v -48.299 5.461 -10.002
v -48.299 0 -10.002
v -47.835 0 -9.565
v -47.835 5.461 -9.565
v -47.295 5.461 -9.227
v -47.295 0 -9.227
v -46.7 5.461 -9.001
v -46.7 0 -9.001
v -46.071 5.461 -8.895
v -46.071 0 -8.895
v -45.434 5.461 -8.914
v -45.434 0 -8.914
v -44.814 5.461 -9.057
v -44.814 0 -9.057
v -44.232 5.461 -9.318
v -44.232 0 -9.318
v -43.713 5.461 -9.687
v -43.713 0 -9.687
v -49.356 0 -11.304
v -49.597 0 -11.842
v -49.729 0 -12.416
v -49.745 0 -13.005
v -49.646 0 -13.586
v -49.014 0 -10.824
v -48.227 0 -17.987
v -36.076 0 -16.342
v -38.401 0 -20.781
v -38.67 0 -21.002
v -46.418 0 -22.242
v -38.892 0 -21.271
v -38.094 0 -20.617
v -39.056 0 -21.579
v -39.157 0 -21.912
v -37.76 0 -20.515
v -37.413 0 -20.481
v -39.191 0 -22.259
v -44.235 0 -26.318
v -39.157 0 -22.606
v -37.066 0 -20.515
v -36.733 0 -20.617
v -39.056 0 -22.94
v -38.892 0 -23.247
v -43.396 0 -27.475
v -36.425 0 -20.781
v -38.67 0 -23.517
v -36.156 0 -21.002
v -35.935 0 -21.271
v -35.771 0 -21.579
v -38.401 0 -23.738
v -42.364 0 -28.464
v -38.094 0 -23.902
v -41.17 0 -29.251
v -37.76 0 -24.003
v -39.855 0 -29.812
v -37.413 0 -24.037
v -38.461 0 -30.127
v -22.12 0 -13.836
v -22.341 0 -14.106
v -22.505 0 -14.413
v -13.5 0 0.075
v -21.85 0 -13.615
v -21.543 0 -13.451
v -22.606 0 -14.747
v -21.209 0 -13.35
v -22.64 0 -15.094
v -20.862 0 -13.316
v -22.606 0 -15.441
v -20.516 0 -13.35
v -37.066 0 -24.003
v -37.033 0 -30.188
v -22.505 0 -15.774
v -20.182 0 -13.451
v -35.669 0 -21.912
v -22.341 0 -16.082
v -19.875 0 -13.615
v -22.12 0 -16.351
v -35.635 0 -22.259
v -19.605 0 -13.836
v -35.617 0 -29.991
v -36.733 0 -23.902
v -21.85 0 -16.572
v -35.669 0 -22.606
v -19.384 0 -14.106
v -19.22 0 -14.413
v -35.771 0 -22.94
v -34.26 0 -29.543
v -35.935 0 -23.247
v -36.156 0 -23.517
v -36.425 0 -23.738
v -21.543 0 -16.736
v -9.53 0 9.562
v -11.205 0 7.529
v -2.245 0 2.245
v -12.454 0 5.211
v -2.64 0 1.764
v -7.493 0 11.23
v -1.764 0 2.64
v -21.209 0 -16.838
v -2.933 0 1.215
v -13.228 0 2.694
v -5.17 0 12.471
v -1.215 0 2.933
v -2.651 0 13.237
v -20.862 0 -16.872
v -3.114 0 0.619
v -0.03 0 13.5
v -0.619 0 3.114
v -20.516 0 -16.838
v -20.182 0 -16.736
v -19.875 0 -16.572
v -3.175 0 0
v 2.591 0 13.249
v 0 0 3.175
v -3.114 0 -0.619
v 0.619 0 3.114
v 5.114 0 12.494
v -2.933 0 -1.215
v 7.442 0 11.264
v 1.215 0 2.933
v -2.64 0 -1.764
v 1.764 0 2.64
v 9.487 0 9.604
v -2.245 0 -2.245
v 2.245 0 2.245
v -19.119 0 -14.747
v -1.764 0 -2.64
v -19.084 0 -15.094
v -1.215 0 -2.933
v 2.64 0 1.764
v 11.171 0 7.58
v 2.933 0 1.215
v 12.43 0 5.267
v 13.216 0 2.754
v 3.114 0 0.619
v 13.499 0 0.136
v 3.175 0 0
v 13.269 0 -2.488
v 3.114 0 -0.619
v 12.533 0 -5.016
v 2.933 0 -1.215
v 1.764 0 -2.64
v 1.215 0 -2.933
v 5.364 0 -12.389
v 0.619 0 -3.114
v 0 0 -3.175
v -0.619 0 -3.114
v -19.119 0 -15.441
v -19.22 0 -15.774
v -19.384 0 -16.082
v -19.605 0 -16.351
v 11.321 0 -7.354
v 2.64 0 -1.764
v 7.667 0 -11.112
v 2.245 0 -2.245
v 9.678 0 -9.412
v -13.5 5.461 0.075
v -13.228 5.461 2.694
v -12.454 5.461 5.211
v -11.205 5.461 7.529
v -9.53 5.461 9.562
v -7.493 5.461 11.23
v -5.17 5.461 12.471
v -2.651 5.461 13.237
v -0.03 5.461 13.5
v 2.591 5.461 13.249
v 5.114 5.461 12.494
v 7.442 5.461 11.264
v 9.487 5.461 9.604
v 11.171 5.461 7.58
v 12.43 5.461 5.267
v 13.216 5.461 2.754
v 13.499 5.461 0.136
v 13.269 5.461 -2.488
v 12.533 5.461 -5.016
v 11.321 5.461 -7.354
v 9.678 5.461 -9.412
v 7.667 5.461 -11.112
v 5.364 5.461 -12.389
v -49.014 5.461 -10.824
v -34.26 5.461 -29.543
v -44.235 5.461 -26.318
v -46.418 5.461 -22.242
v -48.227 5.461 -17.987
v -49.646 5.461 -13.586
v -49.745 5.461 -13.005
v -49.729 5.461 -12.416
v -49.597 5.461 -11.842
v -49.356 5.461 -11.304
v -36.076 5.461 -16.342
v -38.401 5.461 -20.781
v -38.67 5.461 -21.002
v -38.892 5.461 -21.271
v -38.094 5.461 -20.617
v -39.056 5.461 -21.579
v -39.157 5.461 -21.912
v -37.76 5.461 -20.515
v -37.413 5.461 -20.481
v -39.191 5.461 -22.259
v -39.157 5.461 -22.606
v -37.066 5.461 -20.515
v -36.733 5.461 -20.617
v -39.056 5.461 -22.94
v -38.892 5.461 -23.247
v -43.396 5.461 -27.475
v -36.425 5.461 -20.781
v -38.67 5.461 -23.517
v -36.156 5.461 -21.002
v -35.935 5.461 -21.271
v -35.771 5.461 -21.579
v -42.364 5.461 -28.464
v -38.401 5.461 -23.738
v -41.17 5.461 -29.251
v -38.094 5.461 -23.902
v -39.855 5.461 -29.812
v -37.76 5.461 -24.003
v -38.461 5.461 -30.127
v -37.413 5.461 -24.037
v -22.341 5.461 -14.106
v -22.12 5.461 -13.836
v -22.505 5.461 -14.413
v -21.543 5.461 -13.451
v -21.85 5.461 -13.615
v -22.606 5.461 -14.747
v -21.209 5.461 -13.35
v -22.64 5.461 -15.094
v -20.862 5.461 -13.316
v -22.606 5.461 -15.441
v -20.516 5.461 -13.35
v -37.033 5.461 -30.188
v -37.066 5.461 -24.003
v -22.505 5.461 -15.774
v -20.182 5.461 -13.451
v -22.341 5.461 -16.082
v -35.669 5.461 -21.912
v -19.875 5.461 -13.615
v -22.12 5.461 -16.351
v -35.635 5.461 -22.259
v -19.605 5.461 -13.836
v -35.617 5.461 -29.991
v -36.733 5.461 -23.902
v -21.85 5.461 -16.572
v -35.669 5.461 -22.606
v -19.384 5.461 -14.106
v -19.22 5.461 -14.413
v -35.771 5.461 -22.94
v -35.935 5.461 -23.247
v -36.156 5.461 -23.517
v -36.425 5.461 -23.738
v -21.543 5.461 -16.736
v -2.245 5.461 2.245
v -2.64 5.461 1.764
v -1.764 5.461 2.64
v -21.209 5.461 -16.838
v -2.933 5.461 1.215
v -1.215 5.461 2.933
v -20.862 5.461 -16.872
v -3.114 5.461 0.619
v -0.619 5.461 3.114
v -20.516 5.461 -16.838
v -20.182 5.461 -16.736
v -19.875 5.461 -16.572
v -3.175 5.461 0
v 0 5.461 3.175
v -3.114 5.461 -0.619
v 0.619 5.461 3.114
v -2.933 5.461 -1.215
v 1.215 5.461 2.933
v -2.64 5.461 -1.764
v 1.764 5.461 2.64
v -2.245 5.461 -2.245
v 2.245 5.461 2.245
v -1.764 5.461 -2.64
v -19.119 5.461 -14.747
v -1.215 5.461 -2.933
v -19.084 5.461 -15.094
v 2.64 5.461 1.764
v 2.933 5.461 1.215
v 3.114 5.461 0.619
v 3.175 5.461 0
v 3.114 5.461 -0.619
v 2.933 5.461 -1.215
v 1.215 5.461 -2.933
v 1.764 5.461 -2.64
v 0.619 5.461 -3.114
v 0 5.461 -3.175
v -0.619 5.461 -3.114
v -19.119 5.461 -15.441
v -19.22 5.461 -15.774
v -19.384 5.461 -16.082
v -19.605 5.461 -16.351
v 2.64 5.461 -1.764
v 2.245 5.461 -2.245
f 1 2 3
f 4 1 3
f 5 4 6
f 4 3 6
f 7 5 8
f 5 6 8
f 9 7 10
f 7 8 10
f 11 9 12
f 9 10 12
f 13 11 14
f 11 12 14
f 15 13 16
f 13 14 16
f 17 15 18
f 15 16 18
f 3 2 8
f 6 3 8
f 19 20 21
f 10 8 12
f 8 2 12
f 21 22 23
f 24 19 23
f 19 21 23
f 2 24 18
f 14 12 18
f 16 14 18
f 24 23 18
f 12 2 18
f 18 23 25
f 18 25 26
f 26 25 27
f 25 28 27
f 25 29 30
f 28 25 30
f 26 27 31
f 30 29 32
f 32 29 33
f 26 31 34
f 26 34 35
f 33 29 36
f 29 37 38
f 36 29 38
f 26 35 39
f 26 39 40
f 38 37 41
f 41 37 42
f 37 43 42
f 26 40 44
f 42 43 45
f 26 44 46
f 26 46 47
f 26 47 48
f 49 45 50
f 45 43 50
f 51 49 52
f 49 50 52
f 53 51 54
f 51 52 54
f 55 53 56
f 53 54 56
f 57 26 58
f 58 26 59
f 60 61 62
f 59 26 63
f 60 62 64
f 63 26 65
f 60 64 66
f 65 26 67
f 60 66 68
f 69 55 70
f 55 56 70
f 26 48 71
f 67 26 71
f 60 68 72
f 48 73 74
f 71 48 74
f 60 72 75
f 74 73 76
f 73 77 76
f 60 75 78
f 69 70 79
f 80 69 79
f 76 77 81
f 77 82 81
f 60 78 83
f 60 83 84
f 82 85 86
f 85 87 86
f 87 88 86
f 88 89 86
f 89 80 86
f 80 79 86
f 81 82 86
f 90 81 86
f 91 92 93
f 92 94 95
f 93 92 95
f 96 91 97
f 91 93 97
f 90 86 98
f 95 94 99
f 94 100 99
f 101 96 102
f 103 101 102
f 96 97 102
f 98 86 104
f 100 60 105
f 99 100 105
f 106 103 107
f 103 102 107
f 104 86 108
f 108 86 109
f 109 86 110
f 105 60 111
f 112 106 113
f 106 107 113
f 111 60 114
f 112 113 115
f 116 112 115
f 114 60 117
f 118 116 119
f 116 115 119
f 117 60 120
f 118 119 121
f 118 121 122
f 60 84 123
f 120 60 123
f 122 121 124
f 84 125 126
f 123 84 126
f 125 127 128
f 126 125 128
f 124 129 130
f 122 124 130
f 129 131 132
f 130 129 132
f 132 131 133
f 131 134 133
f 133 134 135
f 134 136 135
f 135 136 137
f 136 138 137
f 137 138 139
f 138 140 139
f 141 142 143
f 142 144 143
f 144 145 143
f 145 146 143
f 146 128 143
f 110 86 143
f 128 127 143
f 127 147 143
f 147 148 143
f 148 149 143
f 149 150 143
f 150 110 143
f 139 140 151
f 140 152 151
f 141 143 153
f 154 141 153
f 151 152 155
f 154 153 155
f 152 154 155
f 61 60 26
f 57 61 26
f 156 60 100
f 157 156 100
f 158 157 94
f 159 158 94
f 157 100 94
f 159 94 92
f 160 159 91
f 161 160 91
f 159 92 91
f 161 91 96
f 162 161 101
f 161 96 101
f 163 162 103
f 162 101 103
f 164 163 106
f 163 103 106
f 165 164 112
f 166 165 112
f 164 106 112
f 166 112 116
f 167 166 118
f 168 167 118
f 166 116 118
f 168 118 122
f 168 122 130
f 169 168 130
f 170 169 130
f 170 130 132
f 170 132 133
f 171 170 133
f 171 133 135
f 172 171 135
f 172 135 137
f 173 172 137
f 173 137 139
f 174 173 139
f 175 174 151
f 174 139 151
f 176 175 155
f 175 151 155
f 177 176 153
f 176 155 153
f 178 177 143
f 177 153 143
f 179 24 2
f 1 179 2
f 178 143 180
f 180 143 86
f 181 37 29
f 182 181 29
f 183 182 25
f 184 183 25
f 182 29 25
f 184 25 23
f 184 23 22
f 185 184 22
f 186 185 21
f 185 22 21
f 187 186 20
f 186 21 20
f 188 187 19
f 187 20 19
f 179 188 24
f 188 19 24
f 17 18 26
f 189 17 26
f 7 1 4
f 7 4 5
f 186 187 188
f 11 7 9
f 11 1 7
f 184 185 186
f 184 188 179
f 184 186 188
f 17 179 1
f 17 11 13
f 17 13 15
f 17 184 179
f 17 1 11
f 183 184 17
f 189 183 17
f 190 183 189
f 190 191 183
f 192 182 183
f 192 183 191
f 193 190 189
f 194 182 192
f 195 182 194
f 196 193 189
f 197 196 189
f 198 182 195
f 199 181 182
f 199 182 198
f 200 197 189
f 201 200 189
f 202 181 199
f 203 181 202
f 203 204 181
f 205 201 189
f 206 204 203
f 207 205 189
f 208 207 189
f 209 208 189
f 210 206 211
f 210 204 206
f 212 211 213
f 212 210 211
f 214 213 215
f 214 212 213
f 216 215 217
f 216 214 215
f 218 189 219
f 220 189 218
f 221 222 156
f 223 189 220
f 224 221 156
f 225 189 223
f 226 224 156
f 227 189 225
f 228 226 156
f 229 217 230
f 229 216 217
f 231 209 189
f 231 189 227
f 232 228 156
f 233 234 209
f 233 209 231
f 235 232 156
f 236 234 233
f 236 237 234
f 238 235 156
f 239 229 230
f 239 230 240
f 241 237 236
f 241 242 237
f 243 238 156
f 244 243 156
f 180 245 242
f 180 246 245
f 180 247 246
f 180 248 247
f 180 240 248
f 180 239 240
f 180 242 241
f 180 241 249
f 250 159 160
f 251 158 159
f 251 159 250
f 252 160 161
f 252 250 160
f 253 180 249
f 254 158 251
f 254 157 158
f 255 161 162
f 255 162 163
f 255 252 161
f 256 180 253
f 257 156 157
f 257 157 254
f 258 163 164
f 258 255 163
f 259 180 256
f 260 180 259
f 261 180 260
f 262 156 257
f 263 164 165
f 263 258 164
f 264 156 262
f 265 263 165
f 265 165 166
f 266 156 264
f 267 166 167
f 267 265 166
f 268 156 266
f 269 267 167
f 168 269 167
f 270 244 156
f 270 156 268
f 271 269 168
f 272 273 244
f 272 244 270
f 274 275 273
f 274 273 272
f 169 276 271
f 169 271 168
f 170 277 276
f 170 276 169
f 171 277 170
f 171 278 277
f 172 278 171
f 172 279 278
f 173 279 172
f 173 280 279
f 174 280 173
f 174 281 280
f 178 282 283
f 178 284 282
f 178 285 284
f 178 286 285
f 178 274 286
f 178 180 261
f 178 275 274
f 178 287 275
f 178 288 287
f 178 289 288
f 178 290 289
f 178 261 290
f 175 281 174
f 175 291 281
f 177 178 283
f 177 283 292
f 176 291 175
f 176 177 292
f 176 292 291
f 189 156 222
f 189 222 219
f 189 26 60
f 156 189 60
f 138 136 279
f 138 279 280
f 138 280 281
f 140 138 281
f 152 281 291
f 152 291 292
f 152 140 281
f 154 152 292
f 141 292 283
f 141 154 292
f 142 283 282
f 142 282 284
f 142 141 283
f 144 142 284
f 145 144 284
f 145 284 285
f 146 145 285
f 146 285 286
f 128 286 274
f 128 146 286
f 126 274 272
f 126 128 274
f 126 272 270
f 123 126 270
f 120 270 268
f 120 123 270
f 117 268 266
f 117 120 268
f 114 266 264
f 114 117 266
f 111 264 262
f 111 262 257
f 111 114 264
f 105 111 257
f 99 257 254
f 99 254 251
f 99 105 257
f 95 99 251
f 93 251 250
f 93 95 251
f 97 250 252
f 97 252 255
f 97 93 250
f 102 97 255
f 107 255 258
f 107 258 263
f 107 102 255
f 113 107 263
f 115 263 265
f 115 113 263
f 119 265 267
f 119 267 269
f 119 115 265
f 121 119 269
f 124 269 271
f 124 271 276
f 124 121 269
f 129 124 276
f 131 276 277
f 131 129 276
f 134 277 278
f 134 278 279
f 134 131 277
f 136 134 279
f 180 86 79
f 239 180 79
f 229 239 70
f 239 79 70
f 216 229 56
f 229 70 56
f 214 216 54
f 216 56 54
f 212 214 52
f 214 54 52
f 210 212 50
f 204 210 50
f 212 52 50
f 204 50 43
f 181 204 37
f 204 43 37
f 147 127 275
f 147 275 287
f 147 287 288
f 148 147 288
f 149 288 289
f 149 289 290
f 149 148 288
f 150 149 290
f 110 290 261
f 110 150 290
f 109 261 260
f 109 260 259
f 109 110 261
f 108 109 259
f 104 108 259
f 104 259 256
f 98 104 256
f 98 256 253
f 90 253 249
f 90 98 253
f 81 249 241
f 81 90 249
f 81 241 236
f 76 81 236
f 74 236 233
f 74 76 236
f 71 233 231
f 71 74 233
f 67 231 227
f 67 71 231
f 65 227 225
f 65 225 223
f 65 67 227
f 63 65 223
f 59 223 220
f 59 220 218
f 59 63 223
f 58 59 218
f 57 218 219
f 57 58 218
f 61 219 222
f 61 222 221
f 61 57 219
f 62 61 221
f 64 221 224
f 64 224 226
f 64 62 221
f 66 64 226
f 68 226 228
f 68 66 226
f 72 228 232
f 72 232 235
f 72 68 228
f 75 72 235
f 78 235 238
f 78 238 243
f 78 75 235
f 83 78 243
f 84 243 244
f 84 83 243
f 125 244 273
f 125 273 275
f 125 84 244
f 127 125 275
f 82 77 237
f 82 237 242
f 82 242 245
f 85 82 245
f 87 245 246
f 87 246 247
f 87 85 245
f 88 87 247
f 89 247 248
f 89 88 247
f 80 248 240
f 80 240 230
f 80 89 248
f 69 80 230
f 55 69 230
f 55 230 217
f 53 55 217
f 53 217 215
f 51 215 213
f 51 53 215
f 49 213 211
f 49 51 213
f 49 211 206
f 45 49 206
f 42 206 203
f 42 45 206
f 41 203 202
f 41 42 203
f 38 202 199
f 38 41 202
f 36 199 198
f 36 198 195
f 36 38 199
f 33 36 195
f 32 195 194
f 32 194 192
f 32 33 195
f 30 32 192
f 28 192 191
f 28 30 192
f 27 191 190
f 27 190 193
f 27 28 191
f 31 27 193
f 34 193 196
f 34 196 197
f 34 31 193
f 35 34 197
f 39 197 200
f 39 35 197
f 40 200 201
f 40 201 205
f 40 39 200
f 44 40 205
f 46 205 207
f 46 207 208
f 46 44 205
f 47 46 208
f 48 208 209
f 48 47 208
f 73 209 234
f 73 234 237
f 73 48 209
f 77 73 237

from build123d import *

# Parameters (mm, degrees)
SKETCH1_R           = 1.778
SKETCH1_R_2         = 3.175
BOSS_EXTRUDE1_DEPTH = 5.461


with BuildPart() as part:
    # Sketch1 → Boss-Extrude1 (new body)
    with BuildSketch(Plane(origin=(0, 0, 0), x_dir=(1, 0, 0), z_dir=(0, 1, 0))):
        with BuildLine():
            Line((-36.075553112, 16.34222836), (-13.499793526, -0.074664302))
            ThreePointArc((-13.499793526, -0.074664302), (7.44200849, -11.263503435), (5.363638877, 12.388760148))
            Line((5.363638877, 12.388760148), (-34.259632886, 29.543416329))
            ThreePointArc((-34.259632886, 29.543416329), (-39.855484626, 29.811728531), (-44.234733225, 26.317772344))
            ThreePointArc((-44.234733225, 26.317772344), (-47.370124011, 20.134748964), (-49.646194202, 13.586469955))
            ThreePointArc((-49.646194202, 13.586469955), (-49.677098428, 12.125807852), (-49.01441114, 10.823757773))
            Line((-49.01441114, 10.823757773), (-48.298660873, 10.002329828))
            ThreePointArc((-48.298660873, 10.002329828), (-46.071262537, 8.895051227), (-43.713289862, 9.687095487))
            Line((-43.713289862, 9.687095487), (-36.075553112, 16.34222836))
        make_face()
        with Locations((-20.862458922, 15.093717491)):
            Circle(SKETCH1_R, mode=Mode.SUBTRACT)
        Circle(SKETCH1_R_2, mode=Mode.SUBTRACT)
        with Locations((-37.413253893, 22.259284205)):
            Circle(SKETCH1_R, mode=Mode.SUBTRACT)
    extrude(amount=BOSS_EXTRUDE1_DEPTH)


solid = part.part
